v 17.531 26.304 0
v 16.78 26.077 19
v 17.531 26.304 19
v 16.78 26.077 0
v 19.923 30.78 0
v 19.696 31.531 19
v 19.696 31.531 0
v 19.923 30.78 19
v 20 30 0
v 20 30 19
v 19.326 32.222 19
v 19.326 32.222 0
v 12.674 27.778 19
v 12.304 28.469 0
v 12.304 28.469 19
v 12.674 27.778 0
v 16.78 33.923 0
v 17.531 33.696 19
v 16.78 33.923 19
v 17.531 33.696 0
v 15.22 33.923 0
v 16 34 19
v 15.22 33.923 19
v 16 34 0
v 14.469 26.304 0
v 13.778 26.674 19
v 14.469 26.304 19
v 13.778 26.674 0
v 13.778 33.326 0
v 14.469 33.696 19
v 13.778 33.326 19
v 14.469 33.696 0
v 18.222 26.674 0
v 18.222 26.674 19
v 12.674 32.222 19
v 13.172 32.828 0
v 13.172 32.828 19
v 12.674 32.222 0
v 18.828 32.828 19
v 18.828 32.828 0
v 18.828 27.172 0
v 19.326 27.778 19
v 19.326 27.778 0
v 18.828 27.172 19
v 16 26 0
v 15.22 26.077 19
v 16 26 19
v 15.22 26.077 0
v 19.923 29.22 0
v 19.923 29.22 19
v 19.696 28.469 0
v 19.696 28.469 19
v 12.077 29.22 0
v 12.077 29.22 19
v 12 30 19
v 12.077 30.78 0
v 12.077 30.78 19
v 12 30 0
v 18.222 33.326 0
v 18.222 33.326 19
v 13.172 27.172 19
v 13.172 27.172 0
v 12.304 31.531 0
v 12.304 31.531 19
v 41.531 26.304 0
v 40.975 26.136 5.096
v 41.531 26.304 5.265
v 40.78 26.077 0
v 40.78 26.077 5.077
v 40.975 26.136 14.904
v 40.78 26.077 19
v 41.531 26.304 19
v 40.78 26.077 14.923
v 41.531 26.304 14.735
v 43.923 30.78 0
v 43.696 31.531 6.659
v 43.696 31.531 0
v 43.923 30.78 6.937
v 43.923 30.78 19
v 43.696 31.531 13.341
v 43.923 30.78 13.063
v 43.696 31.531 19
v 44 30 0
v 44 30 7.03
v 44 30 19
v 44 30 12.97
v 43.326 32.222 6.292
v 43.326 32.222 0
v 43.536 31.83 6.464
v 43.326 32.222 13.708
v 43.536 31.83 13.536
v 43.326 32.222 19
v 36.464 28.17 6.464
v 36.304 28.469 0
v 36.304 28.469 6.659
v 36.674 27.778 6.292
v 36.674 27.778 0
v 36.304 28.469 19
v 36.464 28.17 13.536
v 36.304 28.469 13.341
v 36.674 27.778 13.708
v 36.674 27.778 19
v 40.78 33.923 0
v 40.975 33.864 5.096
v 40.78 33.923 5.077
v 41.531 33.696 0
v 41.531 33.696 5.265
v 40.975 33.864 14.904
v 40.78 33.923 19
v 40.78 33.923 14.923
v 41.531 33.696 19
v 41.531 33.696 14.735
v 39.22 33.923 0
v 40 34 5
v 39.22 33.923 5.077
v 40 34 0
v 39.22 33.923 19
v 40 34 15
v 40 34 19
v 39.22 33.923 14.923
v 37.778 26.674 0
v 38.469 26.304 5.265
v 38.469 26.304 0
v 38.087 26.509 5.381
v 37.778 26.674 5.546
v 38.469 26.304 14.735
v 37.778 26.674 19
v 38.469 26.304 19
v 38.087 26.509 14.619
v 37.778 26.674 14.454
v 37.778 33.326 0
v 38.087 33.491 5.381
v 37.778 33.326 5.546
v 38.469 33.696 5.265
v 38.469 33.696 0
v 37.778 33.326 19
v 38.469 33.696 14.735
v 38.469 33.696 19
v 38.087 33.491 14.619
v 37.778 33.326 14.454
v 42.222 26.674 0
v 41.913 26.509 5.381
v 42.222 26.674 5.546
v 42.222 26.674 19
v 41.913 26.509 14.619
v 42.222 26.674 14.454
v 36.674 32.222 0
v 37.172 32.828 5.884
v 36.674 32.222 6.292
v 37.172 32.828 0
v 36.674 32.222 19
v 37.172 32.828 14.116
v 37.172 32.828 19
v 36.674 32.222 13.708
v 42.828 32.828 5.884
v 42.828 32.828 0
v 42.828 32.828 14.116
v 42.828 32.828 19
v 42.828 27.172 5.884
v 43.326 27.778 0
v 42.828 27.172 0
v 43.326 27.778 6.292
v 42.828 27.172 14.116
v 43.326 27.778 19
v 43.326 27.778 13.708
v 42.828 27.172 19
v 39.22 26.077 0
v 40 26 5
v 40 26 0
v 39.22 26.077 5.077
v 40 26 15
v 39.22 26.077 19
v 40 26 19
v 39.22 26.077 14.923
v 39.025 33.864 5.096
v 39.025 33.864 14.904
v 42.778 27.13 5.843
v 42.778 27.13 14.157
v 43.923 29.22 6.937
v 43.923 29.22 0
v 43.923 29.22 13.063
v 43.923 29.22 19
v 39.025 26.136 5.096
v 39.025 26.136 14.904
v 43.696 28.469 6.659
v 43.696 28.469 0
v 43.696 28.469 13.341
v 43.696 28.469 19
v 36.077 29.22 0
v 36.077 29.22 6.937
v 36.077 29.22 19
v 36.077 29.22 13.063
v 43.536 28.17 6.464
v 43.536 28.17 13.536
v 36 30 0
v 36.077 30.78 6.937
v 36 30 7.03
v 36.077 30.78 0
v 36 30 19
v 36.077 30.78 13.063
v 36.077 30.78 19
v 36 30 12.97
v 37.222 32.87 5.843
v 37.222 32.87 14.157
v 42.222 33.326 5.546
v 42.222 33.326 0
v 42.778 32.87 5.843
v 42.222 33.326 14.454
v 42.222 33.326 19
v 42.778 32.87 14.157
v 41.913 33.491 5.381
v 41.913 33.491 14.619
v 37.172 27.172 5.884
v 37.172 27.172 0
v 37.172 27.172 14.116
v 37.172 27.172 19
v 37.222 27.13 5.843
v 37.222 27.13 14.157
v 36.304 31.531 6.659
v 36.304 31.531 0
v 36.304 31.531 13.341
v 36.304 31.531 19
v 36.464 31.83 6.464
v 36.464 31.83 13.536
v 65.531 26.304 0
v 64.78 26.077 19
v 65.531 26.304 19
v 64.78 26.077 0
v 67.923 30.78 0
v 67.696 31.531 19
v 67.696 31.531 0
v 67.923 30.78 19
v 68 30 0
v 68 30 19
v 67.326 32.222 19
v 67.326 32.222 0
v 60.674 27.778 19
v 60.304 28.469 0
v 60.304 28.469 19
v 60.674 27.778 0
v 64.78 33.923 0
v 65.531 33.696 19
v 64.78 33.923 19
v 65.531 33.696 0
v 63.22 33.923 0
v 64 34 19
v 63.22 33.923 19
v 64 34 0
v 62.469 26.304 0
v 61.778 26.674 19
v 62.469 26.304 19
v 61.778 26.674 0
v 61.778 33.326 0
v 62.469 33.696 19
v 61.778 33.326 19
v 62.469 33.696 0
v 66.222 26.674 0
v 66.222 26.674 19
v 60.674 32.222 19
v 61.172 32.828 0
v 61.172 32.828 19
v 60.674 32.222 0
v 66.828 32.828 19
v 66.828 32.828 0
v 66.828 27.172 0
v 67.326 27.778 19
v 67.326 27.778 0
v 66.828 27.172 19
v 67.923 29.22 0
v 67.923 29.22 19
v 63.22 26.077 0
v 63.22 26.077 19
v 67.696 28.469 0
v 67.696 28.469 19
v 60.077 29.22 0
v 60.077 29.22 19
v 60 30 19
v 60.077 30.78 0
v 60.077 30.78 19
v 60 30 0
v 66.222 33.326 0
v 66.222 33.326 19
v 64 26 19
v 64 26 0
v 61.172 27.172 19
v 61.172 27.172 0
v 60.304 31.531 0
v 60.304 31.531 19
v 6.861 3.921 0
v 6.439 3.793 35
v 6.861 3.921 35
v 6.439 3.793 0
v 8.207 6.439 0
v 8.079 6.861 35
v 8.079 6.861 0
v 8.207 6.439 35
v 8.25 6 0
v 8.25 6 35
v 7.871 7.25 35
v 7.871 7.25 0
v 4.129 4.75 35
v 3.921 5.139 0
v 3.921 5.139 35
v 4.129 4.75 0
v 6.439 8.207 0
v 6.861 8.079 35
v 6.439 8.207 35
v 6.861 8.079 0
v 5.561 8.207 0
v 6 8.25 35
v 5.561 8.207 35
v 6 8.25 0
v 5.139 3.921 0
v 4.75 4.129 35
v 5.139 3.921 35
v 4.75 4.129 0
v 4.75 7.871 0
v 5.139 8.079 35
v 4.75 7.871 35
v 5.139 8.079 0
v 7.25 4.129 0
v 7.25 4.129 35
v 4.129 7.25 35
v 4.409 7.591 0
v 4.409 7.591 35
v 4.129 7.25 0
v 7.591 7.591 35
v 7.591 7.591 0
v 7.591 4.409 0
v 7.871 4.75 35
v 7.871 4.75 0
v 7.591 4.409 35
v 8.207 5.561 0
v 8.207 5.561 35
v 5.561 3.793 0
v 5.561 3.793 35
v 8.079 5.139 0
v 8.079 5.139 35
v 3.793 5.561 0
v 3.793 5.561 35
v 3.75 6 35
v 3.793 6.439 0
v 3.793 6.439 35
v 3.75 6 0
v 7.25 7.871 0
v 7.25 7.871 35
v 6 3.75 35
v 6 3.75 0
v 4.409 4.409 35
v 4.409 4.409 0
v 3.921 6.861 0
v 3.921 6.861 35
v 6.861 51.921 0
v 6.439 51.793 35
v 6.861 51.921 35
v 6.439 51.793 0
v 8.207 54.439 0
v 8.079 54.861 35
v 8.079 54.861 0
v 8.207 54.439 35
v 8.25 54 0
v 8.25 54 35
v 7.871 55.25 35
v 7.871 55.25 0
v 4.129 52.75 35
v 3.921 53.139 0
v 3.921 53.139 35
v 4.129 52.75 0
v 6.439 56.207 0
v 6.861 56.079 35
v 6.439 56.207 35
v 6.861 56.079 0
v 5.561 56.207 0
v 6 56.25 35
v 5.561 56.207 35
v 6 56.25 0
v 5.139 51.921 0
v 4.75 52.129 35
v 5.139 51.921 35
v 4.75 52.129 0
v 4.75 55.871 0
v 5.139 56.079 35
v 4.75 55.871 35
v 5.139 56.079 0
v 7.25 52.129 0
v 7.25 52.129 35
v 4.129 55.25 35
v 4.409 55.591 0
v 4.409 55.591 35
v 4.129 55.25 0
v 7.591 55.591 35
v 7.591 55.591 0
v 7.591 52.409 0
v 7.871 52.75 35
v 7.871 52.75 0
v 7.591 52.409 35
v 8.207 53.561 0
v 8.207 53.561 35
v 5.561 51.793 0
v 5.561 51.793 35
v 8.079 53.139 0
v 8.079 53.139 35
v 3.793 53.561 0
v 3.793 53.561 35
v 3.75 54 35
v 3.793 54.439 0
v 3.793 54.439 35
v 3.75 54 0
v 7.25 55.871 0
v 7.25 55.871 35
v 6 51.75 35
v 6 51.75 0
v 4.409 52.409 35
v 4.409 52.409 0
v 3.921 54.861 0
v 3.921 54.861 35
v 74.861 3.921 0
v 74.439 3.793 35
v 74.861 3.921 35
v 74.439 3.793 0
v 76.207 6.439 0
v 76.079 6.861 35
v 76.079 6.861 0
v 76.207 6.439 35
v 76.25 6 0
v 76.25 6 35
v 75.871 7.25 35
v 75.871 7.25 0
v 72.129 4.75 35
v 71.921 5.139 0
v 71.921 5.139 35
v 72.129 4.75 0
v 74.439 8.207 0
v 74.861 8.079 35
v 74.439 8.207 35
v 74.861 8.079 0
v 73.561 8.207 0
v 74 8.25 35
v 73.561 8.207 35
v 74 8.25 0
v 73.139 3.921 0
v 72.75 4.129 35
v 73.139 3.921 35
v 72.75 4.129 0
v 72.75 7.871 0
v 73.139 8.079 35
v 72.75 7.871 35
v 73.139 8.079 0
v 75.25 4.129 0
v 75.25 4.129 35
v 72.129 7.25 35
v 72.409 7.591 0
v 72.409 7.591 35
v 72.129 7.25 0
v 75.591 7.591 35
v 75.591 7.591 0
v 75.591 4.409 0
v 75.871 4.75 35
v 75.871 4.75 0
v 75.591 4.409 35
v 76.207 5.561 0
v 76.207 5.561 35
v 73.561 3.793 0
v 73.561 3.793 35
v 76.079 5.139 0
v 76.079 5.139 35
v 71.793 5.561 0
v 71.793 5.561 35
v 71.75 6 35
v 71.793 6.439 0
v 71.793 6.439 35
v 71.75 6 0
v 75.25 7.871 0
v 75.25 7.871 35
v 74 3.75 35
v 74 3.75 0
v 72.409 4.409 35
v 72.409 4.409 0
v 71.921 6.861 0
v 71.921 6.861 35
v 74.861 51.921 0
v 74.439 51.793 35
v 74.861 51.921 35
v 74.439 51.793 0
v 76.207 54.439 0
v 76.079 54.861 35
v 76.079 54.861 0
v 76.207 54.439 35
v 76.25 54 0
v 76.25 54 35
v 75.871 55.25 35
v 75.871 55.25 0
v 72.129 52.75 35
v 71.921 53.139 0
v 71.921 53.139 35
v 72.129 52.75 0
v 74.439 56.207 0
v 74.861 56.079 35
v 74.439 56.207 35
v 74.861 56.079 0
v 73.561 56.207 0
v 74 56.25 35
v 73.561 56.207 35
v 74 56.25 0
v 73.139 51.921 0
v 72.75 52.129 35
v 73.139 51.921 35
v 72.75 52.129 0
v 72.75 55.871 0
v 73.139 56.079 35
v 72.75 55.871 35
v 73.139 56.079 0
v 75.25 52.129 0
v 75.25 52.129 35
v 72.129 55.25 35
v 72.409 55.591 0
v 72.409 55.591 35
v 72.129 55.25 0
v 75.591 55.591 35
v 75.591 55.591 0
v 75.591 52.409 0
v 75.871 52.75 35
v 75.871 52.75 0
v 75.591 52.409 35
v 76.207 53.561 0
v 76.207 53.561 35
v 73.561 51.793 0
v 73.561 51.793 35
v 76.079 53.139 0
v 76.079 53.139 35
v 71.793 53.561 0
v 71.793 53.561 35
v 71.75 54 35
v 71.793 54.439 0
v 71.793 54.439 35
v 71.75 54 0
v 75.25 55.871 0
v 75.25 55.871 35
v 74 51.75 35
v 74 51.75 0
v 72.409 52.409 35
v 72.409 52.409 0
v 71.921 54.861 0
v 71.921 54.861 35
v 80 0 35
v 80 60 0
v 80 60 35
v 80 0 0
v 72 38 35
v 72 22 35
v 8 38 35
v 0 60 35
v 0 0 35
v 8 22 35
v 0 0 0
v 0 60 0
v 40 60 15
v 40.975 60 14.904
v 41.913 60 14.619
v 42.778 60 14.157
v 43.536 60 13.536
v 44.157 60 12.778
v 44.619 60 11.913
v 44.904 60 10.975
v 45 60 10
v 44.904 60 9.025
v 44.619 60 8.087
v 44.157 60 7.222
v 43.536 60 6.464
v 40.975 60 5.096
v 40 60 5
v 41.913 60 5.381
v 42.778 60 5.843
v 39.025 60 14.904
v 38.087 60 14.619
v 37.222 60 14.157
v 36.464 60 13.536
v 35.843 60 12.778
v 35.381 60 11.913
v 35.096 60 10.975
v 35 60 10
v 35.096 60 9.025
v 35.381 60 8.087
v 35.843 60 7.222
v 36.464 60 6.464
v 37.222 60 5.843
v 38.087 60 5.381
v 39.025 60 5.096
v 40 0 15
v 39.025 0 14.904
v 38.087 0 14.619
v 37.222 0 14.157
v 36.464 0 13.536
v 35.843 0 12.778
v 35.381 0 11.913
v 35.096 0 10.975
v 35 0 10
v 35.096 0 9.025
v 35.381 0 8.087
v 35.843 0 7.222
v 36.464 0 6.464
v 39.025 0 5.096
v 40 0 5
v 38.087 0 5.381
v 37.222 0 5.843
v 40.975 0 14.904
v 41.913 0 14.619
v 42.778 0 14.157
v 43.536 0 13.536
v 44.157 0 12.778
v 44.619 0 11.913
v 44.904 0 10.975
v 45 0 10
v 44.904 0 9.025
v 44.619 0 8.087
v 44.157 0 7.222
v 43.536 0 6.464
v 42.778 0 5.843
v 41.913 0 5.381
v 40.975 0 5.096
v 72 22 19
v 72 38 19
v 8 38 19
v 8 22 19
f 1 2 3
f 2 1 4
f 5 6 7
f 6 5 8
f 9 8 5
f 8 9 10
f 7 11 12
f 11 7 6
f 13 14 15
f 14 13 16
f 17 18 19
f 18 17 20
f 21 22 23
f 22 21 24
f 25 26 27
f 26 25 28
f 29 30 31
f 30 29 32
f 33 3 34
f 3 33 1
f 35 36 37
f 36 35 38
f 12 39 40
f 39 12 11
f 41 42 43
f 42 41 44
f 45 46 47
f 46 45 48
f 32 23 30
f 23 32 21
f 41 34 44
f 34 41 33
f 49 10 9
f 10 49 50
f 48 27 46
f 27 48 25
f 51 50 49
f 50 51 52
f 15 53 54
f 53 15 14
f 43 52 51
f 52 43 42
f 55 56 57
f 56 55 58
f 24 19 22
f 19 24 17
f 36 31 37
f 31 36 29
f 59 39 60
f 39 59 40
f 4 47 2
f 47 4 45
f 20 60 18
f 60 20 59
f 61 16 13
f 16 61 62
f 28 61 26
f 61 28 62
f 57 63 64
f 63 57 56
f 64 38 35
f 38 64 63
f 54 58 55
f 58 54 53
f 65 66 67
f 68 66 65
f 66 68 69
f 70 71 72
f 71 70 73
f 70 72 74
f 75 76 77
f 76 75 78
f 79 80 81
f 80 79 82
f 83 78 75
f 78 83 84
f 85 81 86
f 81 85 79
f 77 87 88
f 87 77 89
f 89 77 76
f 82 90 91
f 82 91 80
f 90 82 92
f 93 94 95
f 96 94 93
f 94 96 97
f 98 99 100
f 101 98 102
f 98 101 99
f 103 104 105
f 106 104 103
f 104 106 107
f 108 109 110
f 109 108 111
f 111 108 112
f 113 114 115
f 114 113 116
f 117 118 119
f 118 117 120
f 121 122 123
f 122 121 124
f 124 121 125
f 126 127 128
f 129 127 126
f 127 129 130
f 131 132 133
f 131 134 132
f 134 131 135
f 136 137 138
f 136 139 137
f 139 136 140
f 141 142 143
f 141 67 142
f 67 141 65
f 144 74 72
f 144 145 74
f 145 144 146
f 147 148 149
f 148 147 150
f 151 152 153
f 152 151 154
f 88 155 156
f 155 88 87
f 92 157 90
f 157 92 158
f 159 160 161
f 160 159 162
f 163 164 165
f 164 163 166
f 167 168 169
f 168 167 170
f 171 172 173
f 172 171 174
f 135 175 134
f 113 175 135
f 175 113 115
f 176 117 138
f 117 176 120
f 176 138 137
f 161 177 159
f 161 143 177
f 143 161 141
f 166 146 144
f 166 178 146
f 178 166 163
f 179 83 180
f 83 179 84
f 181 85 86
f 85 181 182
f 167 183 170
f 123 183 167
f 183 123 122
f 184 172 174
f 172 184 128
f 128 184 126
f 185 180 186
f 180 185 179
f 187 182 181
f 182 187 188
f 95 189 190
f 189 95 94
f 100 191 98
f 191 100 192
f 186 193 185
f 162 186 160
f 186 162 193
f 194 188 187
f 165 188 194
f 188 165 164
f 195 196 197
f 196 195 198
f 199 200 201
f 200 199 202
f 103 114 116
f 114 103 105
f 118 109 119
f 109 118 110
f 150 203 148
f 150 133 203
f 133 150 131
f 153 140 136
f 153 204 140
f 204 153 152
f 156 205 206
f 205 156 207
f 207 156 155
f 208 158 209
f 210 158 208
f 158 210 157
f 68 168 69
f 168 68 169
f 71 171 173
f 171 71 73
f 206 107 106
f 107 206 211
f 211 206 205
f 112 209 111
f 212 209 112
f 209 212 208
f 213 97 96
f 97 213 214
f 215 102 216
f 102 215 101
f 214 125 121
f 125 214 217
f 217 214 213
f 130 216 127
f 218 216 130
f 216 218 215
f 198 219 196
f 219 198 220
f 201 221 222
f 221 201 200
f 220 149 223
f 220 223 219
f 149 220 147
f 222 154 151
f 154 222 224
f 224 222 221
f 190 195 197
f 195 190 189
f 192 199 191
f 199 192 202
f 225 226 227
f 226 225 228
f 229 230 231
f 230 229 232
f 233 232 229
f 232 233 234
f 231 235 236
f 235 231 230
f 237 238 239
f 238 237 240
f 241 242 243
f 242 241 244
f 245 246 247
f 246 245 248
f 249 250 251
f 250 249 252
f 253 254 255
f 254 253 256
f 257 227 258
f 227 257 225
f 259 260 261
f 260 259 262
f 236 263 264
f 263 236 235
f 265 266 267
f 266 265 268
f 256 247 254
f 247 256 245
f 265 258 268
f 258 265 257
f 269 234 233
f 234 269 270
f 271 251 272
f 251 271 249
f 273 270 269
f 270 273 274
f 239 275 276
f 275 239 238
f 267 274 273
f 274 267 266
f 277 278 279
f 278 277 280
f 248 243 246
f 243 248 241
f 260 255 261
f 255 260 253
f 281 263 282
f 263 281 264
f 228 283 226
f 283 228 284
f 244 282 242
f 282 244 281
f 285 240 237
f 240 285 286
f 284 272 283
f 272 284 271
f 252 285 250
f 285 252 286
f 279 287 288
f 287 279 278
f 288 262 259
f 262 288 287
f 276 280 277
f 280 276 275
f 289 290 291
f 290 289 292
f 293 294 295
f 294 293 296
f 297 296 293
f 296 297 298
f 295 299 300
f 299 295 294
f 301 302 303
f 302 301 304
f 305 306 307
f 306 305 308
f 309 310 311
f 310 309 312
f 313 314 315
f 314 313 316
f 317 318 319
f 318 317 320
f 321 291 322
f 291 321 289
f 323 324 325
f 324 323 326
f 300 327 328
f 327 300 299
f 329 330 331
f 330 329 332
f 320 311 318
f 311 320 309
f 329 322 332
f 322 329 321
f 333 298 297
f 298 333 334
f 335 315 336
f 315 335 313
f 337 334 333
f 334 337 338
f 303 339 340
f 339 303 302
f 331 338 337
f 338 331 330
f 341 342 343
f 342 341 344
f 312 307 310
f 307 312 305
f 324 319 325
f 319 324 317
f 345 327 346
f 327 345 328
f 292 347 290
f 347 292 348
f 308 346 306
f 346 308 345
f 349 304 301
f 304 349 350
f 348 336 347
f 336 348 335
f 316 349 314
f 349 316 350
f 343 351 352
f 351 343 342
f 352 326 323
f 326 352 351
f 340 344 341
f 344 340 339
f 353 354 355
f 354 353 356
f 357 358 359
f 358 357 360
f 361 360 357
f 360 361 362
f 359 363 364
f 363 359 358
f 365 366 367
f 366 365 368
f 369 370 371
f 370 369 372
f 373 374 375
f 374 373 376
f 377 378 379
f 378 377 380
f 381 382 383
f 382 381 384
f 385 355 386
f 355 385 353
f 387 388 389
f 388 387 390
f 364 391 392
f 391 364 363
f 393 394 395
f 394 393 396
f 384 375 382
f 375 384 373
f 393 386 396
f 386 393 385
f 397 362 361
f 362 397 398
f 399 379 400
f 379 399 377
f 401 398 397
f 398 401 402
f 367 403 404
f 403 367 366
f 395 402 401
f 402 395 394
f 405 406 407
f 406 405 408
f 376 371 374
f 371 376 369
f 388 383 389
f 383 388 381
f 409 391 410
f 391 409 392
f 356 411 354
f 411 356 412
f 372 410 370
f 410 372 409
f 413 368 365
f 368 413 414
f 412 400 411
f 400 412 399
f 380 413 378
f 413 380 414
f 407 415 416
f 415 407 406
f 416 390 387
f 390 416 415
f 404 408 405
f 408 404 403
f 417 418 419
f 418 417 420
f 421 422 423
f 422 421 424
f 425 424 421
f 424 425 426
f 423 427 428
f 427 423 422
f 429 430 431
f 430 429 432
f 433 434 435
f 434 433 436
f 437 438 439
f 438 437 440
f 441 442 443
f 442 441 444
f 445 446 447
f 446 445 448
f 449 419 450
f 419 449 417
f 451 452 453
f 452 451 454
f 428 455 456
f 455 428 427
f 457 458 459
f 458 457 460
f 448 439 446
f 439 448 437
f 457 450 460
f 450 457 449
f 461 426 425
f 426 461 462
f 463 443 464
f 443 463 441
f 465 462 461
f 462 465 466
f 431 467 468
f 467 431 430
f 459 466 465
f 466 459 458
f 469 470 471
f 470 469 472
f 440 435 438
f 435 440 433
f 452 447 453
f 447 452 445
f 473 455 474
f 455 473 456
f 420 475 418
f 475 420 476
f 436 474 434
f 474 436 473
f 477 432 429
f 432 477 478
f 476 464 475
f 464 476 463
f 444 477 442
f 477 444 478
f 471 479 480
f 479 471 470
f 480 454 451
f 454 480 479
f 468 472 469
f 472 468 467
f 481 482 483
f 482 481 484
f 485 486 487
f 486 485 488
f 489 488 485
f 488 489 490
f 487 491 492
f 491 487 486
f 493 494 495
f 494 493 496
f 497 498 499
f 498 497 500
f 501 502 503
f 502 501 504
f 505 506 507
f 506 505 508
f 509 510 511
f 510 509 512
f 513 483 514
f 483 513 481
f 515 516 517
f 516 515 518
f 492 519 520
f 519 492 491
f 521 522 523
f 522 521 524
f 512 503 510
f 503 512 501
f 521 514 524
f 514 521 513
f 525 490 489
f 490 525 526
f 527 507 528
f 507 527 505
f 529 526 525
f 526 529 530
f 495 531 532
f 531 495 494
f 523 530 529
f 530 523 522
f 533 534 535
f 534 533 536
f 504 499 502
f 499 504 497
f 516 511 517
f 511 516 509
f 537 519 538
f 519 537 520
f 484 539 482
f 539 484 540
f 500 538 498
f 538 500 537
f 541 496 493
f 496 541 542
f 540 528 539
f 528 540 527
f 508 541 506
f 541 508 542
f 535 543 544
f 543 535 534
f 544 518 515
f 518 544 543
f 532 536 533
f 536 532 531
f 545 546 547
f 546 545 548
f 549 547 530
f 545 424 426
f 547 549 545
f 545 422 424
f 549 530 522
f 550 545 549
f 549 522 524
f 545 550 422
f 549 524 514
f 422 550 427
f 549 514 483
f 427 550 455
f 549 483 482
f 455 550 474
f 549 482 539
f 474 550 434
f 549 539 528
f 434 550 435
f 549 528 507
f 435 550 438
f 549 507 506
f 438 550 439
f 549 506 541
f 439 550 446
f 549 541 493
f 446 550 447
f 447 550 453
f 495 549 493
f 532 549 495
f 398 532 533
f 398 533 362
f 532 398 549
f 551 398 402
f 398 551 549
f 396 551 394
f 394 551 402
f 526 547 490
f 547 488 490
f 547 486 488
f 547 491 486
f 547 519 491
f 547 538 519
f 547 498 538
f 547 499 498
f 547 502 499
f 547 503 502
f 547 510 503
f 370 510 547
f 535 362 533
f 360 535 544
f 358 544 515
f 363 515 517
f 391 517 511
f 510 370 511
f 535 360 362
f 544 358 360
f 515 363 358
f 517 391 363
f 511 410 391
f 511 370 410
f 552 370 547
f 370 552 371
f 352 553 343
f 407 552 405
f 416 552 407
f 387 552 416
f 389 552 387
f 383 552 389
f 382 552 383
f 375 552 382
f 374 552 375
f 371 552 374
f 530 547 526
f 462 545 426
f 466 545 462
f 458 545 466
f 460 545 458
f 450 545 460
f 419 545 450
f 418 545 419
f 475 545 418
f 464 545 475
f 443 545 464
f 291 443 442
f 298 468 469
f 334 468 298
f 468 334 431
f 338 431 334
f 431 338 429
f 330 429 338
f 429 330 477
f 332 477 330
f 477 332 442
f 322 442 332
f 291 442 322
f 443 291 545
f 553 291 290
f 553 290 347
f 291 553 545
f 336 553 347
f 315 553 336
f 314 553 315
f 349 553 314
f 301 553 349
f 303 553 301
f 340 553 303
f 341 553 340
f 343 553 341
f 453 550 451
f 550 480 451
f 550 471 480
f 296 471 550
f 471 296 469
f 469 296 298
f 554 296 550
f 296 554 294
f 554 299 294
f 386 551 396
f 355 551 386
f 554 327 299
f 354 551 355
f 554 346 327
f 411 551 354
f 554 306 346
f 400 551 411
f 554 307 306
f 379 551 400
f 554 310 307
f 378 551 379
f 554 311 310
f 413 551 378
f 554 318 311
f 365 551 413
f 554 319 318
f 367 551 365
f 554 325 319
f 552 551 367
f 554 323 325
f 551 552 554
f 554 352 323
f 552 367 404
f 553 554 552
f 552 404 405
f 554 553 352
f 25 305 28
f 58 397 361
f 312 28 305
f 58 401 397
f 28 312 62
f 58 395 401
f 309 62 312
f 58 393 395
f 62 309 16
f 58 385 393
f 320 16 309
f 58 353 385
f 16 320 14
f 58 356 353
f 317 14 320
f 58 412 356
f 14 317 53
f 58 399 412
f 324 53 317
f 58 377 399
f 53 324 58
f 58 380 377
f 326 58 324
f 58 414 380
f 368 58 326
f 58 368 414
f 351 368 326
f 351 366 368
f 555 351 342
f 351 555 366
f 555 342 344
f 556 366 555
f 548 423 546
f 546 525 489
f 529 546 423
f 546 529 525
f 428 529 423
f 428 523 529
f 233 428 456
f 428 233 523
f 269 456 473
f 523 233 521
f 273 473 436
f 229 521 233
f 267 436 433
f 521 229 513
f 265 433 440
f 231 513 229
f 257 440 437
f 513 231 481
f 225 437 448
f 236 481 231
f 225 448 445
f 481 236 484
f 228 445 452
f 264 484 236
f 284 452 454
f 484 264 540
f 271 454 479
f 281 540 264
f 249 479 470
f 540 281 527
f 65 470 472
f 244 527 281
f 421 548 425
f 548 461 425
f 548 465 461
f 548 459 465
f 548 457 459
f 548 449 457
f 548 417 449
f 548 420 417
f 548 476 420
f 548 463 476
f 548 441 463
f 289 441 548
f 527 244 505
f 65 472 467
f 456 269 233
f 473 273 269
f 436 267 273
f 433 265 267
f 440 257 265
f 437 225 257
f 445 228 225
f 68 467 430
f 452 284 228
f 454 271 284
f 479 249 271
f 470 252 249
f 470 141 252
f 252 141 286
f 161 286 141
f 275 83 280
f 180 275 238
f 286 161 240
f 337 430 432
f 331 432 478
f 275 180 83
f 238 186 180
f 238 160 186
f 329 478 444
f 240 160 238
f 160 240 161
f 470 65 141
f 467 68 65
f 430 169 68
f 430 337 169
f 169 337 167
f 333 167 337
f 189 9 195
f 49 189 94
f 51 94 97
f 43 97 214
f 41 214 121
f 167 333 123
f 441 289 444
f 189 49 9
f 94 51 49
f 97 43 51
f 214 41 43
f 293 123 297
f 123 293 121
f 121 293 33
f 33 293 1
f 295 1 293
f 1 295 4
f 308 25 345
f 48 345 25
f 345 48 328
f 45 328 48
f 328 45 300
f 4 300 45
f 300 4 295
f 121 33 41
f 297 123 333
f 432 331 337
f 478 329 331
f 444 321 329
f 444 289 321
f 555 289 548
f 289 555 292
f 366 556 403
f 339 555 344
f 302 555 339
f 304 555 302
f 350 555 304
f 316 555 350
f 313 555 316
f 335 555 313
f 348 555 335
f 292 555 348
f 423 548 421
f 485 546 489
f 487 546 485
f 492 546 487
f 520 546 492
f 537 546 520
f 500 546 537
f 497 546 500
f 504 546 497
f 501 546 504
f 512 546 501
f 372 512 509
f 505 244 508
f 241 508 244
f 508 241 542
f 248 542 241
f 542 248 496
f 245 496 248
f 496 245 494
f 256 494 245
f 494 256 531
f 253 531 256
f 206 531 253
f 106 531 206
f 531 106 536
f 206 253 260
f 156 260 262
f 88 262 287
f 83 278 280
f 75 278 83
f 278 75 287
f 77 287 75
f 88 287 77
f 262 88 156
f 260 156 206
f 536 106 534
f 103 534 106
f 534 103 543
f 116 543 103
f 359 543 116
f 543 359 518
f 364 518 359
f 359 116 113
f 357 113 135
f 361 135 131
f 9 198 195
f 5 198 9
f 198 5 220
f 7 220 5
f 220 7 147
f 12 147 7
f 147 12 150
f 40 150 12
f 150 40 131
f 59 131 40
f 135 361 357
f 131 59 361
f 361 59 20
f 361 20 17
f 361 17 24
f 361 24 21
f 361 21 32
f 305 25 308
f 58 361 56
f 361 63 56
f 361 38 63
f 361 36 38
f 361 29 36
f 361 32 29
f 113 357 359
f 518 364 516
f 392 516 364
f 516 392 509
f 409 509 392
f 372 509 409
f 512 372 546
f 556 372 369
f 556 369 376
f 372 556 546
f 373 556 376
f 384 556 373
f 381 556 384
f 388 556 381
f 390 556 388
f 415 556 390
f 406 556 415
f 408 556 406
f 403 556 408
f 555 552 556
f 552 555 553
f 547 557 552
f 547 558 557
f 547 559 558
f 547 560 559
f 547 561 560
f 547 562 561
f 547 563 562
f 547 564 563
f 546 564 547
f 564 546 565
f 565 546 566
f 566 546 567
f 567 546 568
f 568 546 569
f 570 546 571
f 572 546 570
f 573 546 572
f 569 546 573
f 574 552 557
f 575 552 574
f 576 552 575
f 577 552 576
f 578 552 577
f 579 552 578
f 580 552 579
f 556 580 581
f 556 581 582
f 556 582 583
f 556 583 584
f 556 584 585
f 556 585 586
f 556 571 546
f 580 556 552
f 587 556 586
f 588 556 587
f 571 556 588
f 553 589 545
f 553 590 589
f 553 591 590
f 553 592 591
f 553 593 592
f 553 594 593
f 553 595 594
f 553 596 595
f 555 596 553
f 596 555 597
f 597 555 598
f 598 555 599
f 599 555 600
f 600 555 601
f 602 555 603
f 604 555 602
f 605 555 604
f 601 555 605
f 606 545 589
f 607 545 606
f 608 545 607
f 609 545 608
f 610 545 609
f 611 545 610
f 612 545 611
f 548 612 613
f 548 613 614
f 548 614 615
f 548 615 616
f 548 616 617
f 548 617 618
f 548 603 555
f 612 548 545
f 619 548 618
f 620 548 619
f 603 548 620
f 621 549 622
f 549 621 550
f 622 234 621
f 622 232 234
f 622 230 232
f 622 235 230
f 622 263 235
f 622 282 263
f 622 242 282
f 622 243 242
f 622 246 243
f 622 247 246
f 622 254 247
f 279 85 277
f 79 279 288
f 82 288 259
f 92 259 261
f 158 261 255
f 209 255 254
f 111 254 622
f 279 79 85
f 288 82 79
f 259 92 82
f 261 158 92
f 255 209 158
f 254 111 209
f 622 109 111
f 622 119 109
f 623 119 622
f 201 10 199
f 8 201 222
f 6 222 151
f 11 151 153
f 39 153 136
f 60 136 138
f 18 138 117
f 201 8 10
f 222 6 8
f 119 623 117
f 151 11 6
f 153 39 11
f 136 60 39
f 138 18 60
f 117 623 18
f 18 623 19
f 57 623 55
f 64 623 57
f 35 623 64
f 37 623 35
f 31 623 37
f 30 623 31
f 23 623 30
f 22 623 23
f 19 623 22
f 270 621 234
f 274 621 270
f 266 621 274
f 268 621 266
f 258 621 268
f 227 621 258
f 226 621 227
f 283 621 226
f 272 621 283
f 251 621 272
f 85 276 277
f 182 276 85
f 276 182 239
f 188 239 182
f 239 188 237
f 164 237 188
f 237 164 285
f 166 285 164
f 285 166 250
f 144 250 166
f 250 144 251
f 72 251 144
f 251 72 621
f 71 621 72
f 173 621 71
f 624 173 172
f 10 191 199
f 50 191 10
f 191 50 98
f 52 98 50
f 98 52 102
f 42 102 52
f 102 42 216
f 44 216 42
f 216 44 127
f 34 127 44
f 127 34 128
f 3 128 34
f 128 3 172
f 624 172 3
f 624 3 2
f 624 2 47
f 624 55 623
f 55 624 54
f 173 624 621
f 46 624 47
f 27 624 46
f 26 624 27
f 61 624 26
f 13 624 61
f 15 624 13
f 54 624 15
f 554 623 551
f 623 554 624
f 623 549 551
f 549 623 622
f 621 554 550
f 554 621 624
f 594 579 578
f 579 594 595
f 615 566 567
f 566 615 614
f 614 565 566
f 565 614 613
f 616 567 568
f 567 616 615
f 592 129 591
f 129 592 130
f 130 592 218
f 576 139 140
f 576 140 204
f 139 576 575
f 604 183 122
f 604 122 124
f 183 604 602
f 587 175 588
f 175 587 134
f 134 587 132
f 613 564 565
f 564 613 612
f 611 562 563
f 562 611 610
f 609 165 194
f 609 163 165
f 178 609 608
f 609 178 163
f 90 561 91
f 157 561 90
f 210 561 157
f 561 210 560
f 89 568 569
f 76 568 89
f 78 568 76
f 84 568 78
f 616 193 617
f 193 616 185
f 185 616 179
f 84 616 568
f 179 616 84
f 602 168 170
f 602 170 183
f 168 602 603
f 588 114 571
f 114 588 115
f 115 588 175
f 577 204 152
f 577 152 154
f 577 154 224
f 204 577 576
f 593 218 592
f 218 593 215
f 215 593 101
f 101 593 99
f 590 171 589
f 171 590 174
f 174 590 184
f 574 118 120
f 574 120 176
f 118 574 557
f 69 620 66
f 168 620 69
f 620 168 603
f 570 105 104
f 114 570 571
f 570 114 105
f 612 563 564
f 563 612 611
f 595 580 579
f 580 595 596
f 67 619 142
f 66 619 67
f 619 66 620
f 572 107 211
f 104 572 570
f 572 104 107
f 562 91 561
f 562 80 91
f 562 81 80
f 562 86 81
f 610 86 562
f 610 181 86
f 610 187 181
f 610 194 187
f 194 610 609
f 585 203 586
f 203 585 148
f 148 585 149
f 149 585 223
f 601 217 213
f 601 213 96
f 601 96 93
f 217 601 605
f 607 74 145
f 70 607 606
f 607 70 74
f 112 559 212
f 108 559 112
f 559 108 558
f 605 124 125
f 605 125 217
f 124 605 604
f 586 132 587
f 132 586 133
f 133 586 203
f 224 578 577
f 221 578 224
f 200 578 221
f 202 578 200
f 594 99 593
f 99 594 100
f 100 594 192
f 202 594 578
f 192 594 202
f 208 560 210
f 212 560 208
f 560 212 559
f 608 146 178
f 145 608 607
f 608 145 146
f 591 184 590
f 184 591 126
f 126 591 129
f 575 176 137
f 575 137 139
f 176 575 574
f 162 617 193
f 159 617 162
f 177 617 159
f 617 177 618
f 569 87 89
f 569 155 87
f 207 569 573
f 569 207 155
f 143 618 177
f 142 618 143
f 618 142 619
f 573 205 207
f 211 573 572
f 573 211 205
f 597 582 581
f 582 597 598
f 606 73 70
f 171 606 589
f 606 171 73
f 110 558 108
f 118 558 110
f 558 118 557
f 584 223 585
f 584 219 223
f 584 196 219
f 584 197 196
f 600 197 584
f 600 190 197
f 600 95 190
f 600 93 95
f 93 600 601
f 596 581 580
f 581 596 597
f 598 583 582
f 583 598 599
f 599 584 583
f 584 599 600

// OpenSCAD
$fn = 32;

// ----------------------------------------------------------------------
// Manifold block: side_outlet manifold
// ----------------------------------------------------------------------

// --- parameters (mm) ---
block_l = 80;             // block length, X
block_w = 60;             // block width, Y
block_h = 35;             // block height, Z
port_d = 8;               // port bore diameter
port_pitch = 24;          // port pitch along X
gallery_d = 16;           // top gallery width, Y
gallery_depth = 16;       // gallery pocket depth
wall_p = 8;               // gallery end wall thickness, X
mnt_d = 4.5;              // mounting hole diameter
mnt_in = 6;               // mounting hole inset from the edges
out_d = 10;               // outlet bore diameter
out_z = 10;               // outlet axis height

n_ports = 3;  // ports in the row
port_x0 = (block_l - (n_ports - 1) * port_pitch) / 2;  // first port X

difference() {
  cube([block_l, block_w, block_h]);
  for (i = [0 : n_ports - 1])
    translate([port_x0 + i * port_pitch, block_w / 2, -1])
      cylinder(h = block_h + 2, d = port_d);
  translate([wall_p, block_w / 2 - gallery_d / 2, block_h - gallery_depth])
    cube([block_l - 2 * wall_p, gallery_d, gallery_depth + 1]);
  for (cx = [mnt_in, block_l - mnt_in])
    for (cy = [mnt_in, block_w - mnt_in])
      translate([cx, cy, -1]) cylinder(h = block_h + 2, d = mnt_d);
  translate([block_l / 2, -1, out_z]) rotate([-90, 0, 0])
    cylinder(h = block_w + 2, d = out_d);
}
